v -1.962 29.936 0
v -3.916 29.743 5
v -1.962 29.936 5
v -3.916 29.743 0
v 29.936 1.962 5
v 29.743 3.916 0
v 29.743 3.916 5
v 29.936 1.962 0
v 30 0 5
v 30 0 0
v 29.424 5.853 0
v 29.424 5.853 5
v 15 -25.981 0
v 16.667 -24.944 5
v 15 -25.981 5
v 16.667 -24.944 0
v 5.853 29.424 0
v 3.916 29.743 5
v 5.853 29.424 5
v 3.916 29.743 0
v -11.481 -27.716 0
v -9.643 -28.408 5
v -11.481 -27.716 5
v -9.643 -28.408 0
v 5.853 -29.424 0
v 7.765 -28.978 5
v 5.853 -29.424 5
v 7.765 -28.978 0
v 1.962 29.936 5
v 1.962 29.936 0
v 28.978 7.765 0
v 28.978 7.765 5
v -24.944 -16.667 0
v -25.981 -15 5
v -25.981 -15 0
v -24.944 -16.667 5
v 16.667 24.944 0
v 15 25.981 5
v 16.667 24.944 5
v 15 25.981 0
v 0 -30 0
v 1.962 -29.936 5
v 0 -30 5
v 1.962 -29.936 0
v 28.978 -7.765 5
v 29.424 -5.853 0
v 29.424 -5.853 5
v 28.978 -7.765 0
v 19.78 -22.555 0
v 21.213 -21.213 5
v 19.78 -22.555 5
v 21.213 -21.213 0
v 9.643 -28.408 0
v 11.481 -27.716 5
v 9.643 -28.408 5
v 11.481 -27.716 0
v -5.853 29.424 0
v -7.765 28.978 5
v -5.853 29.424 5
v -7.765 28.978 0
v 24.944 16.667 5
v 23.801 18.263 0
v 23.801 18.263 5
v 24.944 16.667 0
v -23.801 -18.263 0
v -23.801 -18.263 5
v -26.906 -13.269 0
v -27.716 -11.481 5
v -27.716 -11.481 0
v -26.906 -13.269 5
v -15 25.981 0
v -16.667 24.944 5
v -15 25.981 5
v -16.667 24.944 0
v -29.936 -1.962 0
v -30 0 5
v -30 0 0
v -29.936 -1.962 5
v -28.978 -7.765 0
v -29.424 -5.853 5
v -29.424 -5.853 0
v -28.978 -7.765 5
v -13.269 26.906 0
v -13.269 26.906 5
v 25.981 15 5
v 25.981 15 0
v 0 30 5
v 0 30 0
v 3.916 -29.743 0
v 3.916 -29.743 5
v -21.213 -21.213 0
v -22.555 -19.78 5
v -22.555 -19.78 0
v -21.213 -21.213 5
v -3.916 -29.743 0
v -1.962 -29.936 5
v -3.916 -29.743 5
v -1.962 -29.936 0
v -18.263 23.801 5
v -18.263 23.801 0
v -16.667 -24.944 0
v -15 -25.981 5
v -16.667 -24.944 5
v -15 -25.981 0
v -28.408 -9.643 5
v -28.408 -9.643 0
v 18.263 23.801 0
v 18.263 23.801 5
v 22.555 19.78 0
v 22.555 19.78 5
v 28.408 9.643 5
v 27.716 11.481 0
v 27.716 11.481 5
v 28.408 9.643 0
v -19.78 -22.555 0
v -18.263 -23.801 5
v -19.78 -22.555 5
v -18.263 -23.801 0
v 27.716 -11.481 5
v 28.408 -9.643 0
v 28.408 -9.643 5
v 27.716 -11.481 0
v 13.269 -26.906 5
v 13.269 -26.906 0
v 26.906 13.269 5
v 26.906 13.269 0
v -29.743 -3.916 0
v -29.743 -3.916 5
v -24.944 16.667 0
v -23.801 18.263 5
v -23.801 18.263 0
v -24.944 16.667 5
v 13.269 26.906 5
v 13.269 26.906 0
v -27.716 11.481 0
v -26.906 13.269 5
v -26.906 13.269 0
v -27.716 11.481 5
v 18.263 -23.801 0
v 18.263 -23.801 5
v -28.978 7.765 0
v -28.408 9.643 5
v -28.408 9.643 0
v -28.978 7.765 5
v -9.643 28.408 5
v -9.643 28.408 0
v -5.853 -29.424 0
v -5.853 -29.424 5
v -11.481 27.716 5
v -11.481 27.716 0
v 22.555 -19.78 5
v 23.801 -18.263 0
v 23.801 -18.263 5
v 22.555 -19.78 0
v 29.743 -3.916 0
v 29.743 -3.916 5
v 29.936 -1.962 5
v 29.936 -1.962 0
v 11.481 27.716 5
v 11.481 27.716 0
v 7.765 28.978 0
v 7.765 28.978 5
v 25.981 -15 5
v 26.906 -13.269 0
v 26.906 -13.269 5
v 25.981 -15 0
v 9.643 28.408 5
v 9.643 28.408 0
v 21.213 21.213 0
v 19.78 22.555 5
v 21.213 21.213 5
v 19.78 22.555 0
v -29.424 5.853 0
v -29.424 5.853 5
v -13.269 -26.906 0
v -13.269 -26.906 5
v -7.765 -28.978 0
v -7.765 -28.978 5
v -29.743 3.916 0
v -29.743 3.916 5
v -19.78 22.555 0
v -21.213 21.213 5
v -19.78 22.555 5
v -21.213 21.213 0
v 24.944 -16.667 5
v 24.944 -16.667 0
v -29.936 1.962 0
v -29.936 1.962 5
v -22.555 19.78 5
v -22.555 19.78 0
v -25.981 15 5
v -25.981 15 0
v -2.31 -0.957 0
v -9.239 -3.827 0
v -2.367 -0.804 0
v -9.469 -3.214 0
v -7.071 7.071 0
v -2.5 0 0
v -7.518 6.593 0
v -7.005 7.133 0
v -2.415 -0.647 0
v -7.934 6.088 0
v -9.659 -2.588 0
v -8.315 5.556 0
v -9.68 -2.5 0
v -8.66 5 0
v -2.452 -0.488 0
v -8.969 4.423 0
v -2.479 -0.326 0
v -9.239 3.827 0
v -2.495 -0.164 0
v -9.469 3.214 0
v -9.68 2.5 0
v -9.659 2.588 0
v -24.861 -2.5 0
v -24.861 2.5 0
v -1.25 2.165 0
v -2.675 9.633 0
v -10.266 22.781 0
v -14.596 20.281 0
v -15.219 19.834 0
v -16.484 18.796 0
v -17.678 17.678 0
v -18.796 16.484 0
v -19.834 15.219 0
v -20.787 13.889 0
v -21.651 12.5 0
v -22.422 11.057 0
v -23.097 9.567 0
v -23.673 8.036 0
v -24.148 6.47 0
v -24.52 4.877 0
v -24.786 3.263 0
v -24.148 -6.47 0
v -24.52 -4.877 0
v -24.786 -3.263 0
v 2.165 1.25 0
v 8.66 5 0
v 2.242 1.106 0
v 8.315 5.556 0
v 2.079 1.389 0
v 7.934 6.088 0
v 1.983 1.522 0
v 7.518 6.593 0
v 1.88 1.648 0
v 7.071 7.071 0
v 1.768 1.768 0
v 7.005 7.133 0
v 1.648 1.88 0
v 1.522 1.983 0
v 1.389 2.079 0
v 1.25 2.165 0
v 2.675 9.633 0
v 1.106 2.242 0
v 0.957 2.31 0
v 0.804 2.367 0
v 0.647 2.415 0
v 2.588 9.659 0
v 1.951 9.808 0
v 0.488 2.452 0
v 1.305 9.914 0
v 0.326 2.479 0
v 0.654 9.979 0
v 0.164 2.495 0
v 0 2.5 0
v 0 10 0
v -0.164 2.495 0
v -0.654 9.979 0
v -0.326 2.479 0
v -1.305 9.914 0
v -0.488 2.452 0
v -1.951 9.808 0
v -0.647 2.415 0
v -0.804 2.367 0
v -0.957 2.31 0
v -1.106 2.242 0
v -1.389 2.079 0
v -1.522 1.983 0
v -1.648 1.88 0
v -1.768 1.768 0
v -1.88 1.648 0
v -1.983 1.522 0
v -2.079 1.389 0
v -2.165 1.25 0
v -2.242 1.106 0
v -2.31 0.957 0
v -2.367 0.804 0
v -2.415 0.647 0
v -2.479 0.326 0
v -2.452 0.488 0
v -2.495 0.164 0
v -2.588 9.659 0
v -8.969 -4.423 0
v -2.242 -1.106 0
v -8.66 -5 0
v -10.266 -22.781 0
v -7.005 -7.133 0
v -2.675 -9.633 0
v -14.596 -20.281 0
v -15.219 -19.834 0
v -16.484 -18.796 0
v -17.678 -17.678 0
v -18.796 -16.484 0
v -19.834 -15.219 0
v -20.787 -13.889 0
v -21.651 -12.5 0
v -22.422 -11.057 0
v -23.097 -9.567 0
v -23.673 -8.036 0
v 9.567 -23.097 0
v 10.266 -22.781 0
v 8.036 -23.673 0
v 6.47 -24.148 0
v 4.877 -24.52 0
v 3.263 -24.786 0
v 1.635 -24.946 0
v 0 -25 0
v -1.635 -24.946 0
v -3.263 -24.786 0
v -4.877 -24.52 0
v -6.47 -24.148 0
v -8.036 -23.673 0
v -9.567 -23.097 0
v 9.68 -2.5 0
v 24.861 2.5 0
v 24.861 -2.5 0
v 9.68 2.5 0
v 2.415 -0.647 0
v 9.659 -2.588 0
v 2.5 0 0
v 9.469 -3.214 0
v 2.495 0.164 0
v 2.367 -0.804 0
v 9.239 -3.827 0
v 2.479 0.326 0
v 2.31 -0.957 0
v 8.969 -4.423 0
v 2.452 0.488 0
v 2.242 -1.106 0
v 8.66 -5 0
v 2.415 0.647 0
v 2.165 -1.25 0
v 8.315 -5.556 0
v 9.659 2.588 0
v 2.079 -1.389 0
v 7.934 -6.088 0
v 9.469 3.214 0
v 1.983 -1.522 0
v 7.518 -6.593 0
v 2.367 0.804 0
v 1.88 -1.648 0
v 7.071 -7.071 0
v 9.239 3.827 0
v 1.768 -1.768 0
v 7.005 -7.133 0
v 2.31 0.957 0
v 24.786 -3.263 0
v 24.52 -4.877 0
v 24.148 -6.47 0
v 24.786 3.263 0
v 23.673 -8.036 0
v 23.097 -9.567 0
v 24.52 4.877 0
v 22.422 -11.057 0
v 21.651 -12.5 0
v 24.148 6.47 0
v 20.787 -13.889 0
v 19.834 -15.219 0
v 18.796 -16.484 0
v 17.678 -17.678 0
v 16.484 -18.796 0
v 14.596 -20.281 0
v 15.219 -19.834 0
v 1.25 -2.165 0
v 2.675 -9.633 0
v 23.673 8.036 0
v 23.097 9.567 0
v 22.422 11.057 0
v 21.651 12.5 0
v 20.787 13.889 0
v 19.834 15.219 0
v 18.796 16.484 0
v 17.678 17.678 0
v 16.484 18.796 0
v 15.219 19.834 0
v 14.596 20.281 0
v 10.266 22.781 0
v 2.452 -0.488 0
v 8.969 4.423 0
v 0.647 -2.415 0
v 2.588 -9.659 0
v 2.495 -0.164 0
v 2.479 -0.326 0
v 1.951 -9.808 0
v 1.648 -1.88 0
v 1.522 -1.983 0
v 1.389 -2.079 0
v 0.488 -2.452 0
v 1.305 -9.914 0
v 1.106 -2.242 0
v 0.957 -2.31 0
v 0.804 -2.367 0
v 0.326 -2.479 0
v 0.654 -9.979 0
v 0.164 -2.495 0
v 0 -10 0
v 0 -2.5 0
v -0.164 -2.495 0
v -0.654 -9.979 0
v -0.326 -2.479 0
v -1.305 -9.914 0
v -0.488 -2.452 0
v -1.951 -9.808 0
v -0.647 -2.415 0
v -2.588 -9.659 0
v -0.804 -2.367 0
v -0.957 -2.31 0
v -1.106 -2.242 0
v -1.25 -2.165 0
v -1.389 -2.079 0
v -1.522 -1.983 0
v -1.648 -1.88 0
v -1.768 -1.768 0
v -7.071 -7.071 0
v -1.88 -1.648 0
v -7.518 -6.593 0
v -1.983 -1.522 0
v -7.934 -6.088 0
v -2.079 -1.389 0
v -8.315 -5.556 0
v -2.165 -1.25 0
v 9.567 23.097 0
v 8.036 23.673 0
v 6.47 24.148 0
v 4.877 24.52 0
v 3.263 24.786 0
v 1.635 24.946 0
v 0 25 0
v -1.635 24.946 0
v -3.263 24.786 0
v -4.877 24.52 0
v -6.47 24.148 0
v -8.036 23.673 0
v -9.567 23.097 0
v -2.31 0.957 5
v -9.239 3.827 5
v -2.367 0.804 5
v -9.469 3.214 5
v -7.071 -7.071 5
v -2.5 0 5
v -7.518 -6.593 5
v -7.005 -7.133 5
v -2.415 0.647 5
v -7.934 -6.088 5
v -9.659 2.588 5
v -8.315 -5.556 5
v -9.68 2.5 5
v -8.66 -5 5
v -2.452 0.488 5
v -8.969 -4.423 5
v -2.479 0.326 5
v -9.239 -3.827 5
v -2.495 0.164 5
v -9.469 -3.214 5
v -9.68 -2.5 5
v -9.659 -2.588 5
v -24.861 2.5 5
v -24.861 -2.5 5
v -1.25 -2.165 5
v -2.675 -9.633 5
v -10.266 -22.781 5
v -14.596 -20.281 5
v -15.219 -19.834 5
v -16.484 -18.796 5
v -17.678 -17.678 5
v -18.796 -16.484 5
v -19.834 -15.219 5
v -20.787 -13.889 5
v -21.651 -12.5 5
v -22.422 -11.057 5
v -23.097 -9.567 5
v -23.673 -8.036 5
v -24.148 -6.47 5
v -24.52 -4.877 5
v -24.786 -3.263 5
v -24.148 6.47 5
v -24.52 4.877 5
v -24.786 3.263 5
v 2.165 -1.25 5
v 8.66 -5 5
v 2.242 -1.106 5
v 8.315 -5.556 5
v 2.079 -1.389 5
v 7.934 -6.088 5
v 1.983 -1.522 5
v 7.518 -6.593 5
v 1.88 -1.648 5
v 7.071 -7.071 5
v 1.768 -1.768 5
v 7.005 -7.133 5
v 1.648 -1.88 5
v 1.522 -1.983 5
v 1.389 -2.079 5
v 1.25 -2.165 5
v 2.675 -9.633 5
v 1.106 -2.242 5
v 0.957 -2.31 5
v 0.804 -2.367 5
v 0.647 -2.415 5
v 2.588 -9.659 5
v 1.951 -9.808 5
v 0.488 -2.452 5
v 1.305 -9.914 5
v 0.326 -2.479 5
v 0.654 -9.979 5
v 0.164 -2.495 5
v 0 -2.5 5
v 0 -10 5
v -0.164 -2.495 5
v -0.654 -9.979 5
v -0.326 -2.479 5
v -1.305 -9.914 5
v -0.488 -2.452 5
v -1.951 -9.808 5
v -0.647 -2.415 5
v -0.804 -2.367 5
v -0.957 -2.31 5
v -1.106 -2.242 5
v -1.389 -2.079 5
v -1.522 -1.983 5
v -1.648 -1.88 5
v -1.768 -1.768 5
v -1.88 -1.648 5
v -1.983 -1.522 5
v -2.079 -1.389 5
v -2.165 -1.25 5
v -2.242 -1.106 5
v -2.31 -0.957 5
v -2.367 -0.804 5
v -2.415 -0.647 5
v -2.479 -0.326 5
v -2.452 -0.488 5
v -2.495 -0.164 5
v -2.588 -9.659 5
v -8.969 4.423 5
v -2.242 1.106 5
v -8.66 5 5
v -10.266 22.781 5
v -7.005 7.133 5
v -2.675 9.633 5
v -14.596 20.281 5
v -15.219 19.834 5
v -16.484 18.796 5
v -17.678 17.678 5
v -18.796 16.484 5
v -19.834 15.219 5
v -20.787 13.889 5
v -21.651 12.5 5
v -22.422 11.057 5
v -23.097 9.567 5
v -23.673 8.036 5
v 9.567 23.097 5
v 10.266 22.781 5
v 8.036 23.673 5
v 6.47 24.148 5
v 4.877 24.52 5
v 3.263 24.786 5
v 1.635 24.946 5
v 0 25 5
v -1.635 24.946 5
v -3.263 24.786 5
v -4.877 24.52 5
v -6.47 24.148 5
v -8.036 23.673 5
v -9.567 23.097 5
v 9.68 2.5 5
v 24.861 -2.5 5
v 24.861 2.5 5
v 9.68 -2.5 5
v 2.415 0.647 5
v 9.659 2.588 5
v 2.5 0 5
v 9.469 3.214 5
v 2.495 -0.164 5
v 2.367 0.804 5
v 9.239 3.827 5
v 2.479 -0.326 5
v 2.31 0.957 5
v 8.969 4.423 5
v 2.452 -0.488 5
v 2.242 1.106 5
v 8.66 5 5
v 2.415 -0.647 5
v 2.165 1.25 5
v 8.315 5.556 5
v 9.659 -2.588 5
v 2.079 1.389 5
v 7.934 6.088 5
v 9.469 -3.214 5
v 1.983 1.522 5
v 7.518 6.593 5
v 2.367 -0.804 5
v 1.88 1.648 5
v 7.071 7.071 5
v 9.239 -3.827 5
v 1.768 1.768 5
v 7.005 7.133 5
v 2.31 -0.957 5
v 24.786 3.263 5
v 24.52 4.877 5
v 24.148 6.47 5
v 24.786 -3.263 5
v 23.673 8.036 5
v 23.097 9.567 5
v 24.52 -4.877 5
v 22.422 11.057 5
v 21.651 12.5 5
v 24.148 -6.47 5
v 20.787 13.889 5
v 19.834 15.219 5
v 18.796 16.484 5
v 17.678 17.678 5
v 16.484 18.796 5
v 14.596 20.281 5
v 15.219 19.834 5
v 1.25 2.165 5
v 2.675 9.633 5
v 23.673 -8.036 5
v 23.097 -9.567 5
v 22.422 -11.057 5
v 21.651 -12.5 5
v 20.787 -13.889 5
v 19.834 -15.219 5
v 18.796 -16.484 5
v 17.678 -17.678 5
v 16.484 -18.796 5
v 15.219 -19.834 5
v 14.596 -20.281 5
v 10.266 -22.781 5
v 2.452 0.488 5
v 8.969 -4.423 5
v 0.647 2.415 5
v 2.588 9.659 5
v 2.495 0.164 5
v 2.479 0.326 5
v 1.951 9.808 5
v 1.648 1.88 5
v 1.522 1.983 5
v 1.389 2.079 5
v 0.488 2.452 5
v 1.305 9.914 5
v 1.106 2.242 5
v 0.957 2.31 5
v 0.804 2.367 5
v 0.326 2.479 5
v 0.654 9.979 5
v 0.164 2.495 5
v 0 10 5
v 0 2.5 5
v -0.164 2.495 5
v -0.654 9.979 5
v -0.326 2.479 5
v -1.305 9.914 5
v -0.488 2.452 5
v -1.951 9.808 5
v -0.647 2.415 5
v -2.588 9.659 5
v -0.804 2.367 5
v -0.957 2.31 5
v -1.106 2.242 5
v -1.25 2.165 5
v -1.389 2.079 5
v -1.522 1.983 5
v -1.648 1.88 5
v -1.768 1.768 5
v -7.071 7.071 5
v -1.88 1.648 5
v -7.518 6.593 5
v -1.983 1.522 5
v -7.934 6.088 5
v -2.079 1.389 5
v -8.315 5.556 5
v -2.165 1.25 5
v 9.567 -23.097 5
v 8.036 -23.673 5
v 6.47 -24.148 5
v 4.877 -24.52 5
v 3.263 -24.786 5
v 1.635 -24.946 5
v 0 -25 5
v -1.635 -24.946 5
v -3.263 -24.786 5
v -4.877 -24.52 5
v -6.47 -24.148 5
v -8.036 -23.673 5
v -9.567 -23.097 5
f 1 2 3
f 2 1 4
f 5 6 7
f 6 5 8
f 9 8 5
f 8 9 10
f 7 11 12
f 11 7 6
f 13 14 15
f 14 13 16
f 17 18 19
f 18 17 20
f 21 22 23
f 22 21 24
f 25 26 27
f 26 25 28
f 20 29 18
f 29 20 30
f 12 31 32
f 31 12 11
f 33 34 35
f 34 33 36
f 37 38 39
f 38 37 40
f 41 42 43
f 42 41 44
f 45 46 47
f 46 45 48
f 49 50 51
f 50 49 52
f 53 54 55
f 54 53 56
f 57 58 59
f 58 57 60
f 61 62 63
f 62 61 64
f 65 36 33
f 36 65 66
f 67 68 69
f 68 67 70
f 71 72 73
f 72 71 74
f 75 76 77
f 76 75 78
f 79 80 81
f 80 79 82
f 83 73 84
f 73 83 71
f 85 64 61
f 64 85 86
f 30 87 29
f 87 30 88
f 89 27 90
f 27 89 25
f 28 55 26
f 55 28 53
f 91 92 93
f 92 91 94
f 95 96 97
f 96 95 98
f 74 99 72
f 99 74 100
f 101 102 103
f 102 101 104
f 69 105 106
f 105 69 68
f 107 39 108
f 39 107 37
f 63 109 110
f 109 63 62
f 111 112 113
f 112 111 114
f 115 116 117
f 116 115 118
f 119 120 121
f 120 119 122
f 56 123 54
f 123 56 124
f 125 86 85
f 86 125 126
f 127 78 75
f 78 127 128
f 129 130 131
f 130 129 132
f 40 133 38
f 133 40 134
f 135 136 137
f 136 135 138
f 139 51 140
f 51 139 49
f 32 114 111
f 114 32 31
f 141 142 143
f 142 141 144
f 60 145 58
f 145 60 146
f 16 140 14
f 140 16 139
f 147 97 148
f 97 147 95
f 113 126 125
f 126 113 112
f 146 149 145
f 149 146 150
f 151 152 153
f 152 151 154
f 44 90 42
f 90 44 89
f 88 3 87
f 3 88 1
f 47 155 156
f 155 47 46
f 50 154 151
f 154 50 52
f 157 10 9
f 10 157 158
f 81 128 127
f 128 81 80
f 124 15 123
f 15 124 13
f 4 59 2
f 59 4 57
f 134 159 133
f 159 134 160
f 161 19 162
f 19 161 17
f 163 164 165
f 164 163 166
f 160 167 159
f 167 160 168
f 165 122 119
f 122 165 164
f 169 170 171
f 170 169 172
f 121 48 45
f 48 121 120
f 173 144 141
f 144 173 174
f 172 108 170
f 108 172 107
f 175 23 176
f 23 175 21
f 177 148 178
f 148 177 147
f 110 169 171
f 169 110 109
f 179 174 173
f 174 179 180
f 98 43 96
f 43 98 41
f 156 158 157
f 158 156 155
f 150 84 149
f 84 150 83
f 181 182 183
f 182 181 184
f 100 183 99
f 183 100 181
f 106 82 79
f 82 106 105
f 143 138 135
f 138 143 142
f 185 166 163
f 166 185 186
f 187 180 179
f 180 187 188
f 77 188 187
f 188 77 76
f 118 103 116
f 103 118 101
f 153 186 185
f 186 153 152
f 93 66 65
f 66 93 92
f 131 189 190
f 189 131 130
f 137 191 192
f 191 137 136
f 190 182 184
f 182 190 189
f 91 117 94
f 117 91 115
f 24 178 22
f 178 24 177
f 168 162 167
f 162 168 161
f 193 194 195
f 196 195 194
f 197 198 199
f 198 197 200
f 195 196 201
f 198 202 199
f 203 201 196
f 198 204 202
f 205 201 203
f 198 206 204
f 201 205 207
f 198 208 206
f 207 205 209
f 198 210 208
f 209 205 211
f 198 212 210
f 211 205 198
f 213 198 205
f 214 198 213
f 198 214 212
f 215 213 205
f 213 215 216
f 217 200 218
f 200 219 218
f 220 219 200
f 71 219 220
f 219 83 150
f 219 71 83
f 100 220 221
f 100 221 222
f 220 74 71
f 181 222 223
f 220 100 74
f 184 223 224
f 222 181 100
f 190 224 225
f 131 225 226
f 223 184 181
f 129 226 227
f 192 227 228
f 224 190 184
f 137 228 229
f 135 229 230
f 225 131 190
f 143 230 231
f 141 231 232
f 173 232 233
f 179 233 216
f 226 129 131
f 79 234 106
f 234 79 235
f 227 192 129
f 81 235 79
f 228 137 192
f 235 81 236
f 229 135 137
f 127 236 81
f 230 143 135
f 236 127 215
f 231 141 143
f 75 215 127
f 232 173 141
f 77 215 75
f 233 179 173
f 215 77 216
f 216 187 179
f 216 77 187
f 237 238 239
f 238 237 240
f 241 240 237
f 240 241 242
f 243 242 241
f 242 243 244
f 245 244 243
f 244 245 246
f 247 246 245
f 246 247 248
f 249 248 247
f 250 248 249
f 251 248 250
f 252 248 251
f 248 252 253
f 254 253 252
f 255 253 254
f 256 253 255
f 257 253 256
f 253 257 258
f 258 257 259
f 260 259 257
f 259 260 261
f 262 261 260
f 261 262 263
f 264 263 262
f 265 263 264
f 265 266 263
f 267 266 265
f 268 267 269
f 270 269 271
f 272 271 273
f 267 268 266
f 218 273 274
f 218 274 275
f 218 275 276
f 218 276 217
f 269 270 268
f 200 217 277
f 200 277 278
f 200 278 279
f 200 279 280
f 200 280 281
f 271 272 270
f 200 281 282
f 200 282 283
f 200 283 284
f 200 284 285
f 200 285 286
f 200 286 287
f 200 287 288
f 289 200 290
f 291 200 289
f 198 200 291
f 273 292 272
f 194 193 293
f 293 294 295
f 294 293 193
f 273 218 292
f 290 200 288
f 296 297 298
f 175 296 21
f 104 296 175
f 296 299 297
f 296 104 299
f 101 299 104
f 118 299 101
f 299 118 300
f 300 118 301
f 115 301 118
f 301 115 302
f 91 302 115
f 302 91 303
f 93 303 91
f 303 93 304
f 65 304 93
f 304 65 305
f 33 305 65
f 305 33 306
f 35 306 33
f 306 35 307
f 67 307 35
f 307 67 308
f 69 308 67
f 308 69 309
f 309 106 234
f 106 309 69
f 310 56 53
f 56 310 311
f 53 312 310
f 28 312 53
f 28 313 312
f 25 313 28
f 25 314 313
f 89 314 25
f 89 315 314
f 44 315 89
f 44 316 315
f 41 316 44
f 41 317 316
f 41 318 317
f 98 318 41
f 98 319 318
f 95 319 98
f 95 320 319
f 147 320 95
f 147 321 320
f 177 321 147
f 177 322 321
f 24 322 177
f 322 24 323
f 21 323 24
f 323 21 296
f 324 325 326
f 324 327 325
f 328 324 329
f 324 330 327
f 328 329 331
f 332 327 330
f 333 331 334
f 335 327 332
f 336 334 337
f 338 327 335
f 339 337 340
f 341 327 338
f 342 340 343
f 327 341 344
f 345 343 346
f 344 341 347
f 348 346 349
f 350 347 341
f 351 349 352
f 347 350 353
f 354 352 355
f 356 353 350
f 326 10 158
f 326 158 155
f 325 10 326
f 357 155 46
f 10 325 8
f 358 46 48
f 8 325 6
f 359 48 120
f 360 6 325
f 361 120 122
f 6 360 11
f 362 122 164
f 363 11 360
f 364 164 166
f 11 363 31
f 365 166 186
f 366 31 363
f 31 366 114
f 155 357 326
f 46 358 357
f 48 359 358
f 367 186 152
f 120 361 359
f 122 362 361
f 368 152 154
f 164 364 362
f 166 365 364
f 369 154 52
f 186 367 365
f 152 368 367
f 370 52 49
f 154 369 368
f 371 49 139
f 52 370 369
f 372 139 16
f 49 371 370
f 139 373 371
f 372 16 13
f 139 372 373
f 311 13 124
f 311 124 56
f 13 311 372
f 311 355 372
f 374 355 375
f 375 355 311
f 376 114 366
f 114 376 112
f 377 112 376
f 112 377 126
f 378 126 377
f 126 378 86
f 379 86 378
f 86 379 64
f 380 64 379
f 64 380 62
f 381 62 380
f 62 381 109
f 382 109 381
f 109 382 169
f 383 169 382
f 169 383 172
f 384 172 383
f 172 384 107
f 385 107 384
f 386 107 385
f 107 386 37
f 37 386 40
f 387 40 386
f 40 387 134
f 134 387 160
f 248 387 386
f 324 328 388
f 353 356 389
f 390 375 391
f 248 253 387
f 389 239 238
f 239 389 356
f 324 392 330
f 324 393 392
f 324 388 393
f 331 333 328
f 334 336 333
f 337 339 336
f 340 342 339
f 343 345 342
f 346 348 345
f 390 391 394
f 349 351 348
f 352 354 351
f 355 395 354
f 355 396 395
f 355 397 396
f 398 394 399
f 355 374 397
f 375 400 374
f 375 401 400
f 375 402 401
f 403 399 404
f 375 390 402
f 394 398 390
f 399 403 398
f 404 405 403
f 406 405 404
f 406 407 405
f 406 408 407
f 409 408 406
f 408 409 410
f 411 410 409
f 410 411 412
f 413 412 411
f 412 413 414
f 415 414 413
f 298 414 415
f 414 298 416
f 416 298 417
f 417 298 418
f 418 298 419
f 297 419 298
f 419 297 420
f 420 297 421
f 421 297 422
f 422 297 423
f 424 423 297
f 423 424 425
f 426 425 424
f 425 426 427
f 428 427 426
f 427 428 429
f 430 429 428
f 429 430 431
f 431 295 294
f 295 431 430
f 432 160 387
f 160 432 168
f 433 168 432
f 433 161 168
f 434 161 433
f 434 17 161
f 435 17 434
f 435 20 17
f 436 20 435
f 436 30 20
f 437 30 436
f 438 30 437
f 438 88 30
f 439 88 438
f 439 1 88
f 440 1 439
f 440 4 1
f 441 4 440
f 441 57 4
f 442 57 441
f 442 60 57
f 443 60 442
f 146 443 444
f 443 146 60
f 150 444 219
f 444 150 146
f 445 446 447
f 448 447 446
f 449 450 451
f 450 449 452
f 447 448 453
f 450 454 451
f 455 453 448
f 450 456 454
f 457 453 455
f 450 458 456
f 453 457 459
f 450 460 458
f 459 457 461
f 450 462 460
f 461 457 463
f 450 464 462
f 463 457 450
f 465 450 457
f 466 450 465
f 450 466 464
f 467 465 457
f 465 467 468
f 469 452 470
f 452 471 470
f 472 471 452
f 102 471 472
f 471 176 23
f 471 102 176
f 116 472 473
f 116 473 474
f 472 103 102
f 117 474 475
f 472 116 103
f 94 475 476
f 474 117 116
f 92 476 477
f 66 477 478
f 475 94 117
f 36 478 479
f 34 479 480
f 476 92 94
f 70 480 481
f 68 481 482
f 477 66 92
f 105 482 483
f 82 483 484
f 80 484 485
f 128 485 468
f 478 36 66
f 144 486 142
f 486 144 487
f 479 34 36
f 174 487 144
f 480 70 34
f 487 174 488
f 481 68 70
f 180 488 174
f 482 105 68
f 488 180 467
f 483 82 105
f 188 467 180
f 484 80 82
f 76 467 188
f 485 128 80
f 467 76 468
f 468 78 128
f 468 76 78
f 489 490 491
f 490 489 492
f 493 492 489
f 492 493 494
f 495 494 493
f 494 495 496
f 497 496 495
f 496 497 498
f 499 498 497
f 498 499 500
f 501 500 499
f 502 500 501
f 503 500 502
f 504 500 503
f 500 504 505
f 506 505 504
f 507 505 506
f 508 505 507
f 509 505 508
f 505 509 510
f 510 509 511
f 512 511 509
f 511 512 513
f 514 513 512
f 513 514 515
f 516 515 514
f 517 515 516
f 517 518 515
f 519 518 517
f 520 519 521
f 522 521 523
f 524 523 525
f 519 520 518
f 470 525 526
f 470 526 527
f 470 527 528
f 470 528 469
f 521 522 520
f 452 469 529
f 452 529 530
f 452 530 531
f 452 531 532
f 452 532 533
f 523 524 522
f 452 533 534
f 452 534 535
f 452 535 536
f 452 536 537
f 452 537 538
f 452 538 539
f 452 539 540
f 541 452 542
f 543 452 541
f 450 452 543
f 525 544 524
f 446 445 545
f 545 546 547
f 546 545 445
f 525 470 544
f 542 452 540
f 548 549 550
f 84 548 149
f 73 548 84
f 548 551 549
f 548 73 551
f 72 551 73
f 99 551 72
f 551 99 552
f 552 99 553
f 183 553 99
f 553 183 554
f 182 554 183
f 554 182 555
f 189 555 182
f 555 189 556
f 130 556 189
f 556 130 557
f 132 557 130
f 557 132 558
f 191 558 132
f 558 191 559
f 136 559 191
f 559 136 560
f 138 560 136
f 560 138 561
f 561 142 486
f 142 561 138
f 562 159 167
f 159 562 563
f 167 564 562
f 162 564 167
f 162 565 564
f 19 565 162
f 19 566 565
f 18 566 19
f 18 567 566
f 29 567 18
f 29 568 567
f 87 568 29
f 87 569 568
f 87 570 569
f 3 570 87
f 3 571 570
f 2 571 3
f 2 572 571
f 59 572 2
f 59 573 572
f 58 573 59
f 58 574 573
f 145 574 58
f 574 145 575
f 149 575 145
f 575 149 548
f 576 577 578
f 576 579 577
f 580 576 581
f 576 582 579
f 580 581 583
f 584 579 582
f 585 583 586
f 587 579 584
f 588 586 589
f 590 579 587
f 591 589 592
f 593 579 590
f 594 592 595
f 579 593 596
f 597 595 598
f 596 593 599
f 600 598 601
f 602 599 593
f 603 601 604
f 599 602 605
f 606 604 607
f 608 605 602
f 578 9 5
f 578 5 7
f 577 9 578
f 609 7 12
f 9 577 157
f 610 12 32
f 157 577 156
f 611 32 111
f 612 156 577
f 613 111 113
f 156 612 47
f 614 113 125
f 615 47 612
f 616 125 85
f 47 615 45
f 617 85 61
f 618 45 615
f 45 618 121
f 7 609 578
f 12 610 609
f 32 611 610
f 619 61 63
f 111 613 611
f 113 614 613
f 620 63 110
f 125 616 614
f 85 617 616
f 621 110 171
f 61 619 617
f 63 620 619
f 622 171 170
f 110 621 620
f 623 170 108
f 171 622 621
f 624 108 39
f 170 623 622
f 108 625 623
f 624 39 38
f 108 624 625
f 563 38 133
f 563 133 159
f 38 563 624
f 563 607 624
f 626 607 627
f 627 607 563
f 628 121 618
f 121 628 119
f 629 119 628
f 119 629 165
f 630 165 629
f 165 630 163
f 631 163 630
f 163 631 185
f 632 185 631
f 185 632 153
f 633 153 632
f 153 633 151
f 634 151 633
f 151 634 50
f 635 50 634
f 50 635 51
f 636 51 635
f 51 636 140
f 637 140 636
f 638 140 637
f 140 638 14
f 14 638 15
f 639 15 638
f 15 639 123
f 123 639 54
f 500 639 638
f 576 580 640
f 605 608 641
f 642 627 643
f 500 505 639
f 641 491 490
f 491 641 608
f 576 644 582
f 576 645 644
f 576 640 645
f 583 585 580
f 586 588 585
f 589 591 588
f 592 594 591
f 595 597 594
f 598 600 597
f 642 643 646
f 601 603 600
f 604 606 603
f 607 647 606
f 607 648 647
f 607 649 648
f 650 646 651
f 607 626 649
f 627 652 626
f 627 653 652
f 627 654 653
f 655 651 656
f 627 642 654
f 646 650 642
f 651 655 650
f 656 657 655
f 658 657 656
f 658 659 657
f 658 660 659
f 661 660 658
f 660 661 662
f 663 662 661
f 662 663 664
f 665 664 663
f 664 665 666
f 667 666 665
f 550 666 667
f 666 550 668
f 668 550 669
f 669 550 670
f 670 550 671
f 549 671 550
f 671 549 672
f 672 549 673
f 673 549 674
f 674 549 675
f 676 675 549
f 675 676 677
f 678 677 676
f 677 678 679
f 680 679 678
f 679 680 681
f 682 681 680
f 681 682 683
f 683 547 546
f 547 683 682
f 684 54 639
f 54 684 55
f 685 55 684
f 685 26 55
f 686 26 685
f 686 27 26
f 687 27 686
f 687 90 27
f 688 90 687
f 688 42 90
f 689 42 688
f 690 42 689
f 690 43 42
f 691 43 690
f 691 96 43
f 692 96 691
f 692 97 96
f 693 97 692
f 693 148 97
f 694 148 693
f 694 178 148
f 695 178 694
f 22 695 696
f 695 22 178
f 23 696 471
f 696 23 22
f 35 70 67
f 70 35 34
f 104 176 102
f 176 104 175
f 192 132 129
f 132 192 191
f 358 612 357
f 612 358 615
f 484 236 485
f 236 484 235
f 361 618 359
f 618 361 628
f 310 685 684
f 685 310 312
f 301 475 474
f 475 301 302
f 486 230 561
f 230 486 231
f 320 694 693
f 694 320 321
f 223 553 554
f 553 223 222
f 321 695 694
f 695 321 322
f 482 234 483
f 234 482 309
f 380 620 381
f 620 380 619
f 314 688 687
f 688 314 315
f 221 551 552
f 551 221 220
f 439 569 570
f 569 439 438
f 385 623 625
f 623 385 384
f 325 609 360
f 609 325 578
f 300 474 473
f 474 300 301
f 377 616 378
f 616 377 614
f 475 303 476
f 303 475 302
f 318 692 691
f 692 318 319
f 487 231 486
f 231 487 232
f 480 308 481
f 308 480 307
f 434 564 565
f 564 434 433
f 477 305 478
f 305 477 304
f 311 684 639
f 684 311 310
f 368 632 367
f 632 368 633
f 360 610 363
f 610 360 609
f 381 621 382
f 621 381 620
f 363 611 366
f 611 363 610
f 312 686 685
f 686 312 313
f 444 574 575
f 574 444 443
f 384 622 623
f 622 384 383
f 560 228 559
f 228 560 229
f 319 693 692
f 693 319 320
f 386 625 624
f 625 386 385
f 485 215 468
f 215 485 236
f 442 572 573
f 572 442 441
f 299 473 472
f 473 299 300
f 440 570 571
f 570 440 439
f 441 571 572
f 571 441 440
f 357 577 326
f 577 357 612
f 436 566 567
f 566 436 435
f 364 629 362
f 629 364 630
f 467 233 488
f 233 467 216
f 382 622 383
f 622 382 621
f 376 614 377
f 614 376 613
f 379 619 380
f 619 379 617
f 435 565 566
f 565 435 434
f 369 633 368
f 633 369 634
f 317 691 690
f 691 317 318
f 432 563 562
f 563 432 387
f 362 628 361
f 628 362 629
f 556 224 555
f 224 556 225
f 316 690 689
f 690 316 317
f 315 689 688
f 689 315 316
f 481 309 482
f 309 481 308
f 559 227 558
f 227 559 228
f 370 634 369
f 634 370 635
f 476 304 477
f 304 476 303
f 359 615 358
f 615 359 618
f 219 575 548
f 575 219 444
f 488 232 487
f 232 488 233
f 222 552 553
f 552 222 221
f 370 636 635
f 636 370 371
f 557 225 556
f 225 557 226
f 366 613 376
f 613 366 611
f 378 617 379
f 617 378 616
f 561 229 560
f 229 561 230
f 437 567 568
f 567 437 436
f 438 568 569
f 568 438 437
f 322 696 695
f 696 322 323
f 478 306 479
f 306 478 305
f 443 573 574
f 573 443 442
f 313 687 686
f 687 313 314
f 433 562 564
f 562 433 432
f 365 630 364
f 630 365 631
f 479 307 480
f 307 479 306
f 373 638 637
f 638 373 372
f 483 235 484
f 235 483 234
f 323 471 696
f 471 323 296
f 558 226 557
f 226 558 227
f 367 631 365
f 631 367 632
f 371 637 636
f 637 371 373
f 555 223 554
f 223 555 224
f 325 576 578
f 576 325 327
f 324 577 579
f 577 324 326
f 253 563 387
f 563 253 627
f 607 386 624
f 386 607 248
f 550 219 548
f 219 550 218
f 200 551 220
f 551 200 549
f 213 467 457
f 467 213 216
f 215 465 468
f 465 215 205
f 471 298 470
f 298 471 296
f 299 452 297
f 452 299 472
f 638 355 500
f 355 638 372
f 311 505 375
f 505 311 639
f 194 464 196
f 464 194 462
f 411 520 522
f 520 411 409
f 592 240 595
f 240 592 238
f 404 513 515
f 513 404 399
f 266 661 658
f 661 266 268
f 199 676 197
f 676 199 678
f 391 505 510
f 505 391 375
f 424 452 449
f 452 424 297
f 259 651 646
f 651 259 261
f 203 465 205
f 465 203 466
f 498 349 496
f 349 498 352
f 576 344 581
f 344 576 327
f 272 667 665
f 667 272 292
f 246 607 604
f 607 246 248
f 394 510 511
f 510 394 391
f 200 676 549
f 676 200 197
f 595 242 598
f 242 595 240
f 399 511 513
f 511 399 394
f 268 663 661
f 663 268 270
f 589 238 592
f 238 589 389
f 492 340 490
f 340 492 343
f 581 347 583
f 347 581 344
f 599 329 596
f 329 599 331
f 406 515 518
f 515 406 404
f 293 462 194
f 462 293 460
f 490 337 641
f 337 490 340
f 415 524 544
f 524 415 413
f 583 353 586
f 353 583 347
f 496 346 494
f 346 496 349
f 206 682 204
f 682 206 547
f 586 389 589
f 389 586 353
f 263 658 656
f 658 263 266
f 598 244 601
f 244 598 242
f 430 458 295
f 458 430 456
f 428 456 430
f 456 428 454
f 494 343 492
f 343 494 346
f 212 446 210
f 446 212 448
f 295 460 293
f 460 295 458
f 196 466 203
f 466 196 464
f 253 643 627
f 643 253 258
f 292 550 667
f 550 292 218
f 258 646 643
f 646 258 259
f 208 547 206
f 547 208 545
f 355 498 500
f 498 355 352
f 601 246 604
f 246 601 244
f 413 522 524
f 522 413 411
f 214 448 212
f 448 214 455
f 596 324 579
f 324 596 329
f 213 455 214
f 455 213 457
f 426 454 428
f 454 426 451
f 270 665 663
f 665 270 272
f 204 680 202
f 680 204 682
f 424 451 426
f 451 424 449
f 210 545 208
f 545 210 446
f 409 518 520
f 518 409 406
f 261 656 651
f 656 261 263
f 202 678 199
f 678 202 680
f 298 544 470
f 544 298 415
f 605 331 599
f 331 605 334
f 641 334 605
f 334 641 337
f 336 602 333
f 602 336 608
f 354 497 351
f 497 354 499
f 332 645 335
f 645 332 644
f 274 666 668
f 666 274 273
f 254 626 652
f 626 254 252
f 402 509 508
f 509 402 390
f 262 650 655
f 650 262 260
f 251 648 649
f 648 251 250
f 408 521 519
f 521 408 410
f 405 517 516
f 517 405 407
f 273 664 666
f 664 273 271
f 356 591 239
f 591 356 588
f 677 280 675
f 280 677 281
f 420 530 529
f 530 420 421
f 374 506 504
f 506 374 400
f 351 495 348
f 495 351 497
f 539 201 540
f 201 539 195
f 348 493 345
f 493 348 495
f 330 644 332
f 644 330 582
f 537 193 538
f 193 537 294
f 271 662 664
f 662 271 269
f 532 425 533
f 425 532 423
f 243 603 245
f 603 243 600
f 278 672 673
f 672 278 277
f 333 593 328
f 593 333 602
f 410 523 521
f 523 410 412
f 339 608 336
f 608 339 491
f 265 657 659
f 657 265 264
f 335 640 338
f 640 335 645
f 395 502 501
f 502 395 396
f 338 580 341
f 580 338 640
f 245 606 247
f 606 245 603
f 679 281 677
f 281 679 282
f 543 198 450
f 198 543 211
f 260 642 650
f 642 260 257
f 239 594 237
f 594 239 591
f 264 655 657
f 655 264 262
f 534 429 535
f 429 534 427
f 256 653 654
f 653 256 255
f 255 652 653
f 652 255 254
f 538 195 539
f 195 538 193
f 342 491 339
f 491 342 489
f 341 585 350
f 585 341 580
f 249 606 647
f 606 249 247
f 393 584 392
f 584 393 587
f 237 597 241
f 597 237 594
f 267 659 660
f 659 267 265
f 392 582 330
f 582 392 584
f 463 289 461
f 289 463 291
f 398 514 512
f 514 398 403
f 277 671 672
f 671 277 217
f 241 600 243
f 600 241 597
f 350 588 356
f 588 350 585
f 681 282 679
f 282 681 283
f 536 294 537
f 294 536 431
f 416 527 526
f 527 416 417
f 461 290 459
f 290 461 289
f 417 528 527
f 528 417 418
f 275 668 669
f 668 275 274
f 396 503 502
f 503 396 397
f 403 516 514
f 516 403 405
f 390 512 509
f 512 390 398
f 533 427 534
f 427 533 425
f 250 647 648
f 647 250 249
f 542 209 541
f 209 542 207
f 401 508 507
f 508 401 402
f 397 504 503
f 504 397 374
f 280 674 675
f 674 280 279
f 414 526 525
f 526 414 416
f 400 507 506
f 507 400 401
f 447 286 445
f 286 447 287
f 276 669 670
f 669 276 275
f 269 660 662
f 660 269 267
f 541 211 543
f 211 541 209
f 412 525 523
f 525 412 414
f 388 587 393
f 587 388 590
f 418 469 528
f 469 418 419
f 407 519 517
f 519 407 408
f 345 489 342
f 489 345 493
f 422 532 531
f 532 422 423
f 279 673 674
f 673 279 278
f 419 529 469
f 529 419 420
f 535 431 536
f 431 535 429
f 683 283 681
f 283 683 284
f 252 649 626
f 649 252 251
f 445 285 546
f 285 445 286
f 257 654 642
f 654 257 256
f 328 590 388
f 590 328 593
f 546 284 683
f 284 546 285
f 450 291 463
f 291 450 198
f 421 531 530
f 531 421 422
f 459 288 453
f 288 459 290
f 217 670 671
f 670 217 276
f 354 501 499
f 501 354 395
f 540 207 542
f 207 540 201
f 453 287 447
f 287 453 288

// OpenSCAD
// Spoked wheel for a small sample cart
// Print orientation: flat on bed, centred on origin, builds up +Z

$fn = 96;

// ---- Dimensions (mm) ----
thickness      = 5;    // overall part thickness (Z)
rim_od         = 60;   // rim outer diameter
rim_width      = 5;    // rim radial width
hub_d          = 20;   // hub diameter
axle_d         = 5;    // axle hole diameter
spoke_count    = 6;    // number of spokes
spoke_width    = 5;    // spoke width
spoke_start_angle = 0; // first spoke along +X

// ---- Derived ----
rim_id      = rim_od - 2 * rim_width;     // rim inner diameter (50)
spoke_r0    = hub_d / 2 - 1;              // spoke starts inside hub (overlap)
spoke_r1    = rim_id / 2 + 1;             // spoke ends inside rim (overlap)
spoke_len   = spoke_r1 - spoke_r0;
eps         = 0.5;                        // cutter overshoot

difference() {
    union() {
        // Outer rim
        difference() {
            cylinder(h = thickness, d = rim_od);
            translate([0, 0, -eps])
                cylinder(h = thickness + 2 * eps, d = rim_id);
        }

        // Hub
        cylinder(h = thickness, d = hub_d);

        // Spokes
        for (i = [0 : spoke_count - 1])
            rotate([0, 0, spoke_start_angle + i * 360 / spoke_count])
                translate([spoke_r0, -spoke_width / 2, 0])
                    cube([spoke_len, spoke_width, thickness]);
    }

    // Axle hole
    translate([0, 0, -eps])
        cylinder(h = thickness + 2 * eps, d = axle_d);
}
